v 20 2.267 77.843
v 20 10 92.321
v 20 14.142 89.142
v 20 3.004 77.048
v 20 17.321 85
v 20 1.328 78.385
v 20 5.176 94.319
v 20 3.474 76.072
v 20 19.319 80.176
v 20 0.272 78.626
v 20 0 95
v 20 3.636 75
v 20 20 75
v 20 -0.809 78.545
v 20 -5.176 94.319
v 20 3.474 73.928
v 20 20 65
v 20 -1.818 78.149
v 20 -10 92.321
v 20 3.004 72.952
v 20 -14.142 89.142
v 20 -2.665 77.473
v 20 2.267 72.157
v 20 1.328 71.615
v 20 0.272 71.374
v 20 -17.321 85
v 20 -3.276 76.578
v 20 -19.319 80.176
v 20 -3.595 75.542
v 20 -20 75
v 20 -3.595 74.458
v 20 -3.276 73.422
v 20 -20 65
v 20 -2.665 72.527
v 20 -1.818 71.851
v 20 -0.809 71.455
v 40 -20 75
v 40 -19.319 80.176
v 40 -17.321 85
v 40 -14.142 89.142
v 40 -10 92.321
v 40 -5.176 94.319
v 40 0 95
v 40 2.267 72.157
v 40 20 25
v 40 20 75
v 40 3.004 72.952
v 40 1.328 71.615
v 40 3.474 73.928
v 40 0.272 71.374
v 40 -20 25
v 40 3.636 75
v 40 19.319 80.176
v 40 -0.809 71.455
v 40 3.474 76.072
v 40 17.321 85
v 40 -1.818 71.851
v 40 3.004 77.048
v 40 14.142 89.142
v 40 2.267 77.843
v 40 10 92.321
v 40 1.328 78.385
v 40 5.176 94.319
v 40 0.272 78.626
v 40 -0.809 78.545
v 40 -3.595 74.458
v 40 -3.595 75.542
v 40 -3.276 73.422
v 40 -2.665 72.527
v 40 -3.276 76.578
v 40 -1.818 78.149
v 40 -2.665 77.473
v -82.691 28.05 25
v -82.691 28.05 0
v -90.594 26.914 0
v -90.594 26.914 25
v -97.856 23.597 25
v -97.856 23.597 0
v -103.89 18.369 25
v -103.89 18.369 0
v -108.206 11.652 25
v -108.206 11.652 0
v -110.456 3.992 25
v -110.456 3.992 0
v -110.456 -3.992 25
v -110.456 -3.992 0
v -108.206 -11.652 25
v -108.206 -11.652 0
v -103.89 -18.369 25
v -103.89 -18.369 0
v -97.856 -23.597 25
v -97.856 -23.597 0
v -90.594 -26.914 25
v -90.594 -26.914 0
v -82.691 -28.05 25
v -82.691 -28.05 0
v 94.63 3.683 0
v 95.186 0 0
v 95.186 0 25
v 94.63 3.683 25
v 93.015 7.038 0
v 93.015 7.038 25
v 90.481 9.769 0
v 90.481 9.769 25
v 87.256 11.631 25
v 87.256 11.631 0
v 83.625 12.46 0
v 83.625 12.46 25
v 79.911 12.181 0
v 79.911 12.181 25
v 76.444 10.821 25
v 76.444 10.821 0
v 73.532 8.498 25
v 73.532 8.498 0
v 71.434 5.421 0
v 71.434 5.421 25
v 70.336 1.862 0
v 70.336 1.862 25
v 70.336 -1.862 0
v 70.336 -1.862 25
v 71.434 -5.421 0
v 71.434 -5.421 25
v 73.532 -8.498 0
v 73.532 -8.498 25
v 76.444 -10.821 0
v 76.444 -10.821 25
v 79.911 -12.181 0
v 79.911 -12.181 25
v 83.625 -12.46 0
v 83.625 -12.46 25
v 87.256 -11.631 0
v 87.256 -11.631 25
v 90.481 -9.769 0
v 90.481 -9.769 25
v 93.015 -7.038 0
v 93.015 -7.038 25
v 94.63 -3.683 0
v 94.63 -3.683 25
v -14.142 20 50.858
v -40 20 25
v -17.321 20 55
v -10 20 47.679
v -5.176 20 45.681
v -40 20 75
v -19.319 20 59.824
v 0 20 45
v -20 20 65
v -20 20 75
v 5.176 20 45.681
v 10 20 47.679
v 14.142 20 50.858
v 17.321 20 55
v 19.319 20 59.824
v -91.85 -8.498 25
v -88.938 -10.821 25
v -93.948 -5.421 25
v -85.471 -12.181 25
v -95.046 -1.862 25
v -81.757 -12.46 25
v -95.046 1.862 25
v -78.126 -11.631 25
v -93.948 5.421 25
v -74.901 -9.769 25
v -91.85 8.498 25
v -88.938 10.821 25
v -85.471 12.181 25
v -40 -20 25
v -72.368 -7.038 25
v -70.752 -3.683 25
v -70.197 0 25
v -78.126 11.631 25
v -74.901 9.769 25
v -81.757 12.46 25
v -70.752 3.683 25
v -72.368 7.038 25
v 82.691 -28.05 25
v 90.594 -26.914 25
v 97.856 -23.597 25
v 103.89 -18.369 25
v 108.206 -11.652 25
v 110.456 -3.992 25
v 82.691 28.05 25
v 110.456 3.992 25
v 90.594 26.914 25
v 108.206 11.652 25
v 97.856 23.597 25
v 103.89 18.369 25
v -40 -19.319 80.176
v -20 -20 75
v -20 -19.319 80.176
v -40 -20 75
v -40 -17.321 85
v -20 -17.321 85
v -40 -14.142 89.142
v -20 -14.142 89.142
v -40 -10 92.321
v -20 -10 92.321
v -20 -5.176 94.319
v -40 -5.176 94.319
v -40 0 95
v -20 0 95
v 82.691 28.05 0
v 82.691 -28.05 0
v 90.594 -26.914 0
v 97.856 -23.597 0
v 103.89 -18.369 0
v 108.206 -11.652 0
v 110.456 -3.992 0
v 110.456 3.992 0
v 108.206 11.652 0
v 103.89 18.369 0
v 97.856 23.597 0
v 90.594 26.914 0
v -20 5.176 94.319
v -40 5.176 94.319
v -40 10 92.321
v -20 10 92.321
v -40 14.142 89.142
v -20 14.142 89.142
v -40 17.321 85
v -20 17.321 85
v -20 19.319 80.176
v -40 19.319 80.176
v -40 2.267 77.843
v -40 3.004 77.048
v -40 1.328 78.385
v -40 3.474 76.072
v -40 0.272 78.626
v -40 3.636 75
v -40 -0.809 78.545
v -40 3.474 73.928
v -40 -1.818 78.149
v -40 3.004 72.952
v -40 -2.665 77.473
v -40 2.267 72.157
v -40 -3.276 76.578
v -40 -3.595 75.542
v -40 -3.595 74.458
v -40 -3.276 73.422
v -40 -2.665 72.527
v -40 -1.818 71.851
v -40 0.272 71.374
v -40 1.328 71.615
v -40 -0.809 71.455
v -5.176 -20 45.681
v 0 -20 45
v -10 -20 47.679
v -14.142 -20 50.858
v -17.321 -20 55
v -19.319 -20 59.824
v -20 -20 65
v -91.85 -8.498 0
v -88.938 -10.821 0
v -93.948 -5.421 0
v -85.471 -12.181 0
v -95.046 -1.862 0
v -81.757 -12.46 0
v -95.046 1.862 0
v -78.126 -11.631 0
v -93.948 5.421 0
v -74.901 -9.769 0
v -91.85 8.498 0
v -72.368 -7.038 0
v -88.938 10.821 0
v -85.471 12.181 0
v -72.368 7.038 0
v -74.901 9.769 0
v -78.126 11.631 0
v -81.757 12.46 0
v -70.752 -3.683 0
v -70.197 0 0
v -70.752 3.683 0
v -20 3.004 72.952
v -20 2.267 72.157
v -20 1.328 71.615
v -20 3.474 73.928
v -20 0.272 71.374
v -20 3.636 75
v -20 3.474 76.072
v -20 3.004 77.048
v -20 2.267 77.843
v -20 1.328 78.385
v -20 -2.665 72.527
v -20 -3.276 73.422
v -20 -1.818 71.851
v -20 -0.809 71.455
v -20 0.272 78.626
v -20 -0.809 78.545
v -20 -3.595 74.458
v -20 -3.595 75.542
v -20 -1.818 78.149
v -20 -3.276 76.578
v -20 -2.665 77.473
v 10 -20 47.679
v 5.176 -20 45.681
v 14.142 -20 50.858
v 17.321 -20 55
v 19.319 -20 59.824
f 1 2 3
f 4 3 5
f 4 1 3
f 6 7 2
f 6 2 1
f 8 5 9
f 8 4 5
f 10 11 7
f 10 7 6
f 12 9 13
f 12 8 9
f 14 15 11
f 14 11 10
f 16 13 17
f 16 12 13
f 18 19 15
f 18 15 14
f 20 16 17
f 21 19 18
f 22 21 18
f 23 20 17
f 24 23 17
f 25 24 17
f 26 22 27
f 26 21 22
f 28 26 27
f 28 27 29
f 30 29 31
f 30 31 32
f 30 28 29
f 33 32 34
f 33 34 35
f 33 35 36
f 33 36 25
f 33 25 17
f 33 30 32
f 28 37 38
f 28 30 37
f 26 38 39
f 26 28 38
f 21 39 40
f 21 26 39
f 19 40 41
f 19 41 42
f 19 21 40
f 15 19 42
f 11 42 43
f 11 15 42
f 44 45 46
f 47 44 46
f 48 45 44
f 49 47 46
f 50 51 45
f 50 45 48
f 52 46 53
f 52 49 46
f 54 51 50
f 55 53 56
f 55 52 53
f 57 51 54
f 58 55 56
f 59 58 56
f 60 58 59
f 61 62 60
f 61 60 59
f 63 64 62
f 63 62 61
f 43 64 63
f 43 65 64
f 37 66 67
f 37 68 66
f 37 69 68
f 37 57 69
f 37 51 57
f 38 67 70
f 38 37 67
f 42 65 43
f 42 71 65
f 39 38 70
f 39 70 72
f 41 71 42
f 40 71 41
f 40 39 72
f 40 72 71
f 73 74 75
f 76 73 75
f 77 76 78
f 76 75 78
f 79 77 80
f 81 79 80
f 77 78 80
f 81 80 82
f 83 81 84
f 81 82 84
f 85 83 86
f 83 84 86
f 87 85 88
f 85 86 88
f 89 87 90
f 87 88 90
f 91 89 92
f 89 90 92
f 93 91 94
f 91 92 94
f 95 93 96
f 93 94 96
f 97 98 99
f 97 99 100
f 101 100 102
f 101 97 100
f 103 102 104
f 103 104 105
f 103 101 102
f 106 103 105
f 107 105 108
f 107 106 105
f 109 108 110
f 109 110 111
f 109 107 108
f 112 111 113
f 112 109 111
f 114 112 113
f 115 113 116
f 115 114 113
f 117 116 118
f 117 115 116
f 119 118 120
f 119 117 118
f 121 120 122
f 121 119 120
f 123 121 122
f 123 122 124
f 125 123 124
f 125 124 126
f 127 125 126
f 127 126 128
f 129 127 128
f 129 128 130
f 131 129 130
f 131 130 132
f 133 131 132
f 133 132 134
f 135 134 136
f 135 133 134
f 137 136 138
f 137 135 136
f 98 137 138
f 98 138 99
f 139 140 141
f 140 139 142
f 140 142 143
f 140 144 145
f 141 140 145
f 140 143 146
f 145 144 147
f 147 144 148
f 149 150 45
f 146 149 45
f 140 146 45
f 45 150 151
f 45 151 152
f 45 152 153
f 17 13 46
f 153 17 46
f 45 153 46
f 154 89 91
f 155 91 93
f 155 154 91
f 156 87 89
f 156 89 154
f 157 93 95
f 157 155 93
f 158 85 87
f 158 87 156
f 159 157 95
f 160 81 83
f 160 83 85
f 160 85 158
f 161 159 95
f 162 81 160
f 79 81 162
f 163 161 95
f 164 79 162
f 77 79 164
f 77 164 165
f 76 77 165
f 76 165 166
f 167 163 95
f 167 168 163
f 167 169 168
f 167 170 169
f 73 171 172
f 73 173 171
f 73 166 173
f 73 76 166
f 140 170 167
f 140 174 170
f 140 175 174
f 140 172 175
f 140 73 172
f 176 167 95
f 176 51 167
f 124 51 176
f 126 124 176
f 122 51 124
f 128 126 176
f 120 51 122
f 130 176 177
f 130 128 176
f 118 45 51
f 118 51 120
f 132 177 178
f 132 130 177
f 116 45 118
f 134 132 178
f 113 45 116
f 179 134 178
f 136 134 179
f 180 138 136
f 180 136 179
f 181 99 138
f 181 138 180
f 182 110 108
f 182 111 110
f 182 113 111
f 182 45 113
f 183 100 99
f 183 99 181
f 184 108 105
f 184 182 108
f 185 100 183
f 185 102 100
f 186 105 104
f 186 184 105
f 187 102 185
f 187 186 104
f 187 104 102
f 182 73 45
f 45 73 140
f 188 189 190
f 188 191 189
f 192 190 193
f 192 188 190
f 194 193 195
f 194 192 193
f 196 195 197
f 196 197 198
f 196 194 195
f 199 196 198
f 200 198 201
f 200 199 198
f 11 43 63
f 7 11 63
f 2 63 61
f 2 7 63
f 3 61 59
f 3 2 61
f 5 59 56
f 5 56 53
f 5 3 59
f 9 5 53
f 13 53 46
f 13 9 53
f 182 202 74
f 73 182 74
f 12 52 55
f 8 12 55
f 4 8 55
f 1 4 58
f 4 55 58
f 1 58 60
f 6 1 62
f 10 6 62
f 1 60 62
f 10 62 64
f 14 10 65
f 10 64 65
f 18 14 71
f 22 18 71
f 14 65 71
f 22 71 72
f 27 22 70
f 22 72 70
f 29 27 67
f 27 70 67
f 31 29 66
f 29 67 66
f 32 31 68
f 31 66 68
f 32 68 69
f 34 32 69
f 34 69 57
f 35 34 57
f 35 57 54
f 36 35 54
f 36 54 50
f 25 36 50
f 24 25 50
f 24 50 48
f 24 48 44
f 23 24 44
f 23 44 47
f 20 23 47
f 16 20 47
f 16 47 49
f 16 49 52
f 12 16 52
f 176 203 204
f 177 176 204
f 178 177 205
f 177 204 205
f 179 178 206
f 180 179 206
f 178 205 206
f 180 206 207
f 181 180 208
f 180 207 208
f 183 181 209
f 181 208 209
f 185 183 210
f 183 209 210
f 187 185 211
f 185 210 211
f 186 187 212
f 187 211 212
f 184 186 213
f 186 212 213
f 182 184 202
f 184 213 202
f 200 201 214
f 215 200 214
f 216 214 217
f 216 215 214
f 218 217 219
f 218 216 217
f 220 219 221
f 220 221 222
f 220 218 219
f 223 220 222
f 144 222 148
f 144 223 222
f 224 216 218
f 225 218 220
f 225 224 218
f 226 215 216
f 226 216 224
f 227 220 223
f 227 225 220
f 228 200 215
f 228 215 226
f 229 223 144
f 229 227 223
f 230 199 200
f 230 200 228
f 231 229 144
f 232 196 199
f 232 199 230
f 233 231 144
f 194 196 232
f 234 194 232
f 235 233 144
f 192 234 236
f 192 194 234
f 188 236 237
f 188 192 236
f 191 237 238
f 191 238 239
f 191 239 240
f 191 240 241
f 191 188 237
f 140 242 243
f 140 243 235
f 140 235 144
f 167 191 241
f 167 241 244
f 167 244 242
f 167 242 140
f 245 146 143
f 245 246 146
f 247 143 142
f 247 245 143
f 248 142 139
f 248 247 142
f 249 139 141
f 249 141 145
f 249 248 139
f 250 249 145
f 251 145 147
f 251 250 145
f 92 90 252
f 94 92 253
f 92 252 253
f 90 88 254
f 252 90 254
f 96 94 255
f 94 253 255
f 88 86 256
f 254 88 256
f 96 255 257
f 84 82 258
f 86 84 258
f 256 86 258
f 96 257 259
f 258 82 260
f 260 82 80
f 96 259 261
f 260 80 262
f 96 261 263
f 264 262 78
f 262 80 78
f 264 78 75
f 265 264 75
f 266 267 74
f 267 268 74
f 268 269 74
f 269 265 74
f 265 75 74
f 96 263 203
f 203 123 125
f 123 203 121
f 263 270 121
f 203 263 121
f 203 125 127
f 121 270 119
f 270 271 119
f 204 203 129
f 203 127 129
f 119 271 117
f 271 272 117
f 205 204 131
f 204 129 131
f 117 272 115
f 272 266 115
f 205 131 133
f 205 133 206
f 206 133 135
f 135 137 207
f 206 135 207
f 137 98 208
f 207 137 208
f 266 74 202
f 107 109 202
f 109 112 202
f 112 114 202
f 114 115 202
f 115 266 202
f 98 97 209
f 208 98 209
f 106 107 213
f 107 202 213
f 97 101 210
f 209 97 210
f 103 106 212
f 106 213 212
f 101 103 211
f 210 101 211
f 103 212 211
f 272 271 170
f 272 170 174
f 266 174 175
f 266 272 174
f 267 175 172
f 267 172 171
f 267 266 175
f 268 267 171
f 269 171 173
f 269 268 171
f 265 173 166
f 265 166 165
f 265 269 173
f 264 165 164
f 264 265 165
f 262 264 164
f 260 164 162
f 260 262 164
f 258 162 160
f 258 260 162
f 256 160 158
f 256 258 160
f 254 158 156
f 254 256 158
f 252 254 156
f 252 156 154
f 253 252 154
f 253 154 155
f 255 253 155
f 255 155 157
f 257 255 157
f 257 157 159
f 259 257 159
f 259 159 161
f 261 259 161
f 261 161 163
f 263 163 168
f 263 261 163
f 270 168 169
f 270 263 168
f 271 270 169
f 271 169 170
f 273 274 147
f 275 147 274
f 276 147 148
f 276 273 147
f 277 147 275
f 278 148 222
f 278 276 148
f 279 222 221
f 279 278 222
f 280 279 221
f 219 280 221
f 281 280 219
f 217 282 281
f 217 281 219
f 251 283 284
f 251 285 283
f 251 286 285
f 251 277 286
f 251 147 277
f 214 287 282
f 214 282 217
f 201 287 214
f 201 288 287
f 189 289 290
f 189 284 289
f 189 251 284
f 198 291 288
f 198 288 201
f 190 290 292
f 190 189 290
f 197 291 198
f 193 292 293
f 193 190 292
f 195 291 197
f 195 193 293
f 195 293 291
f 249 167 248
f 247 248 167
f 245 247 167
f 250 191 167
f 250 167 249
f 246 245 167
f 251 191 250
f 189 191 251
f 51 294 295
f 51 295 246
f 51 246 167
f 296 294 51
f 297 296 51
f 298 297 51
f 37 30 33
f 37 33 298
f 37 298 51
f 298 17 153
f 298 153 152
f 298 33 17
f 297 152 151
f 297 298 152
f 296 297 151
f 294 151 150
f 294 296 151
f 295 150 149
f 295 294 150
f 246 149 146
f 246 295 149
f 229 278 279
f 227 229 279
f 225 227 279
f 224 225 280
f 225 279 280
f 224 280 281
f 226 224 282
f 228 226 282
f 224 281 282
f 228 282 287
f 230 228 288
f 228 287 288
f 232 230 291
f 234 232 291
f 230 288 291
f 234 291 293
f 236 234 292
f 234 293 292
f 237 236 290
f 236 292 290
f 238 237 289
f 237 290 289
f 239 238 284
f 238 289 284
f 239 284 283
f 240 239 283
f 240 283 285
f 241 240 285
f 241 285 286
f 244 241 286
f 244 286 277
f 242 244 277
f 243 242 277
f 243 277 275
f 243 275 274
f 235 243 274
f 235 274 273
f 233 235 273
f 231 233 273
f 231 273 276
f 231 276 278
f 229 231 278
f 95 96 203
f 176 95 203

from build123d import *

# Parameters (mm, degrees)
F0_R     = 12.4944504689
F1_DEPTH = 25
F3_DEPTH = 20
F4_R     = 19.99999
F5_R     = 19.99999
F6_R     = 3.63588552
F7_DEPTH = 150.7420863042


# Not quite as in the source:
# - a fillet or chamfer is up to 0.001 mm smaller than in the source, because OpenCascade refuses the exact size


with BuildPart() as f1:
    # F0 (on Top) → F1 (new body)
    with BuildSketch(Plane.XY):
        with BuildLine():
            Line((-82.6911404729, -28.0499458313), (82.6911404729, -28.0499458313))
            ThreePointArc((82.6911404729, -28.0499458313), (110.7410863042, 0), (82.6911404729, 28.0499458313))
            Line((82.6911404729, 28.0499458313), (-82.6911404729, 28.0499458313))
            ThreePointArc((-82.6911404729, 28.0499458313), (-110.7410863042, 0), (-82.6911404729, -28.0499458313))
        make_face()
        with Locations((-82.6911404729, 0)):
            Circle(F0_R, mode=Mode.SUBTRACT)
        with Locations((82.6911404729, 0)):
            Circle(F0_R, mode=Mode.SUBTRACT)
    extrude(amount=F1_DEPTH)

    # F2 (on Front) → F3 (join, symmetric)
    with BuildSketch(Plane.XZ):
        Polygon((-40, 25), (40, 25), (40, 95), (20, 95), (20, 45), (-20, 45), (-20, 95), (-40, 95), align=None)
    extrude(amount=F3_DEPTH, both=True)

    # F4 (radius 20 in the source; OpenCascade refuses exactly that, so slightly less here)
    f4_edges = [f1.edges().sort_by_distance(p)[0] for p in [
        (-20, 0, 45),
        (20, 0, 45),
    ]]
    fillet(f4_edges, radius=F4_R)

    # F5 (radius 20 in the source; OpenCascade refuses exactly that, so slightly less here)
    f5_edges = [f1.edges().sort_by_distance(p)[0] for p in [
        (-30, -20, 95),
        (-30, 20, 95),
        (30, -20, 95),
        (30, 20, 95),
    ]]
    fillet(f5_edges, radius=F5_R)

    # F6 (on face) → F7 (cut, through all)
    with BuildSketch(Plane.YZ.offset(40)):
        with Locations((0, 75)):
            Circle(F6_R)
    extrude(amount=-F7_DEPTH, mode=Mode.SUBTRACT)


solid = f1.part
